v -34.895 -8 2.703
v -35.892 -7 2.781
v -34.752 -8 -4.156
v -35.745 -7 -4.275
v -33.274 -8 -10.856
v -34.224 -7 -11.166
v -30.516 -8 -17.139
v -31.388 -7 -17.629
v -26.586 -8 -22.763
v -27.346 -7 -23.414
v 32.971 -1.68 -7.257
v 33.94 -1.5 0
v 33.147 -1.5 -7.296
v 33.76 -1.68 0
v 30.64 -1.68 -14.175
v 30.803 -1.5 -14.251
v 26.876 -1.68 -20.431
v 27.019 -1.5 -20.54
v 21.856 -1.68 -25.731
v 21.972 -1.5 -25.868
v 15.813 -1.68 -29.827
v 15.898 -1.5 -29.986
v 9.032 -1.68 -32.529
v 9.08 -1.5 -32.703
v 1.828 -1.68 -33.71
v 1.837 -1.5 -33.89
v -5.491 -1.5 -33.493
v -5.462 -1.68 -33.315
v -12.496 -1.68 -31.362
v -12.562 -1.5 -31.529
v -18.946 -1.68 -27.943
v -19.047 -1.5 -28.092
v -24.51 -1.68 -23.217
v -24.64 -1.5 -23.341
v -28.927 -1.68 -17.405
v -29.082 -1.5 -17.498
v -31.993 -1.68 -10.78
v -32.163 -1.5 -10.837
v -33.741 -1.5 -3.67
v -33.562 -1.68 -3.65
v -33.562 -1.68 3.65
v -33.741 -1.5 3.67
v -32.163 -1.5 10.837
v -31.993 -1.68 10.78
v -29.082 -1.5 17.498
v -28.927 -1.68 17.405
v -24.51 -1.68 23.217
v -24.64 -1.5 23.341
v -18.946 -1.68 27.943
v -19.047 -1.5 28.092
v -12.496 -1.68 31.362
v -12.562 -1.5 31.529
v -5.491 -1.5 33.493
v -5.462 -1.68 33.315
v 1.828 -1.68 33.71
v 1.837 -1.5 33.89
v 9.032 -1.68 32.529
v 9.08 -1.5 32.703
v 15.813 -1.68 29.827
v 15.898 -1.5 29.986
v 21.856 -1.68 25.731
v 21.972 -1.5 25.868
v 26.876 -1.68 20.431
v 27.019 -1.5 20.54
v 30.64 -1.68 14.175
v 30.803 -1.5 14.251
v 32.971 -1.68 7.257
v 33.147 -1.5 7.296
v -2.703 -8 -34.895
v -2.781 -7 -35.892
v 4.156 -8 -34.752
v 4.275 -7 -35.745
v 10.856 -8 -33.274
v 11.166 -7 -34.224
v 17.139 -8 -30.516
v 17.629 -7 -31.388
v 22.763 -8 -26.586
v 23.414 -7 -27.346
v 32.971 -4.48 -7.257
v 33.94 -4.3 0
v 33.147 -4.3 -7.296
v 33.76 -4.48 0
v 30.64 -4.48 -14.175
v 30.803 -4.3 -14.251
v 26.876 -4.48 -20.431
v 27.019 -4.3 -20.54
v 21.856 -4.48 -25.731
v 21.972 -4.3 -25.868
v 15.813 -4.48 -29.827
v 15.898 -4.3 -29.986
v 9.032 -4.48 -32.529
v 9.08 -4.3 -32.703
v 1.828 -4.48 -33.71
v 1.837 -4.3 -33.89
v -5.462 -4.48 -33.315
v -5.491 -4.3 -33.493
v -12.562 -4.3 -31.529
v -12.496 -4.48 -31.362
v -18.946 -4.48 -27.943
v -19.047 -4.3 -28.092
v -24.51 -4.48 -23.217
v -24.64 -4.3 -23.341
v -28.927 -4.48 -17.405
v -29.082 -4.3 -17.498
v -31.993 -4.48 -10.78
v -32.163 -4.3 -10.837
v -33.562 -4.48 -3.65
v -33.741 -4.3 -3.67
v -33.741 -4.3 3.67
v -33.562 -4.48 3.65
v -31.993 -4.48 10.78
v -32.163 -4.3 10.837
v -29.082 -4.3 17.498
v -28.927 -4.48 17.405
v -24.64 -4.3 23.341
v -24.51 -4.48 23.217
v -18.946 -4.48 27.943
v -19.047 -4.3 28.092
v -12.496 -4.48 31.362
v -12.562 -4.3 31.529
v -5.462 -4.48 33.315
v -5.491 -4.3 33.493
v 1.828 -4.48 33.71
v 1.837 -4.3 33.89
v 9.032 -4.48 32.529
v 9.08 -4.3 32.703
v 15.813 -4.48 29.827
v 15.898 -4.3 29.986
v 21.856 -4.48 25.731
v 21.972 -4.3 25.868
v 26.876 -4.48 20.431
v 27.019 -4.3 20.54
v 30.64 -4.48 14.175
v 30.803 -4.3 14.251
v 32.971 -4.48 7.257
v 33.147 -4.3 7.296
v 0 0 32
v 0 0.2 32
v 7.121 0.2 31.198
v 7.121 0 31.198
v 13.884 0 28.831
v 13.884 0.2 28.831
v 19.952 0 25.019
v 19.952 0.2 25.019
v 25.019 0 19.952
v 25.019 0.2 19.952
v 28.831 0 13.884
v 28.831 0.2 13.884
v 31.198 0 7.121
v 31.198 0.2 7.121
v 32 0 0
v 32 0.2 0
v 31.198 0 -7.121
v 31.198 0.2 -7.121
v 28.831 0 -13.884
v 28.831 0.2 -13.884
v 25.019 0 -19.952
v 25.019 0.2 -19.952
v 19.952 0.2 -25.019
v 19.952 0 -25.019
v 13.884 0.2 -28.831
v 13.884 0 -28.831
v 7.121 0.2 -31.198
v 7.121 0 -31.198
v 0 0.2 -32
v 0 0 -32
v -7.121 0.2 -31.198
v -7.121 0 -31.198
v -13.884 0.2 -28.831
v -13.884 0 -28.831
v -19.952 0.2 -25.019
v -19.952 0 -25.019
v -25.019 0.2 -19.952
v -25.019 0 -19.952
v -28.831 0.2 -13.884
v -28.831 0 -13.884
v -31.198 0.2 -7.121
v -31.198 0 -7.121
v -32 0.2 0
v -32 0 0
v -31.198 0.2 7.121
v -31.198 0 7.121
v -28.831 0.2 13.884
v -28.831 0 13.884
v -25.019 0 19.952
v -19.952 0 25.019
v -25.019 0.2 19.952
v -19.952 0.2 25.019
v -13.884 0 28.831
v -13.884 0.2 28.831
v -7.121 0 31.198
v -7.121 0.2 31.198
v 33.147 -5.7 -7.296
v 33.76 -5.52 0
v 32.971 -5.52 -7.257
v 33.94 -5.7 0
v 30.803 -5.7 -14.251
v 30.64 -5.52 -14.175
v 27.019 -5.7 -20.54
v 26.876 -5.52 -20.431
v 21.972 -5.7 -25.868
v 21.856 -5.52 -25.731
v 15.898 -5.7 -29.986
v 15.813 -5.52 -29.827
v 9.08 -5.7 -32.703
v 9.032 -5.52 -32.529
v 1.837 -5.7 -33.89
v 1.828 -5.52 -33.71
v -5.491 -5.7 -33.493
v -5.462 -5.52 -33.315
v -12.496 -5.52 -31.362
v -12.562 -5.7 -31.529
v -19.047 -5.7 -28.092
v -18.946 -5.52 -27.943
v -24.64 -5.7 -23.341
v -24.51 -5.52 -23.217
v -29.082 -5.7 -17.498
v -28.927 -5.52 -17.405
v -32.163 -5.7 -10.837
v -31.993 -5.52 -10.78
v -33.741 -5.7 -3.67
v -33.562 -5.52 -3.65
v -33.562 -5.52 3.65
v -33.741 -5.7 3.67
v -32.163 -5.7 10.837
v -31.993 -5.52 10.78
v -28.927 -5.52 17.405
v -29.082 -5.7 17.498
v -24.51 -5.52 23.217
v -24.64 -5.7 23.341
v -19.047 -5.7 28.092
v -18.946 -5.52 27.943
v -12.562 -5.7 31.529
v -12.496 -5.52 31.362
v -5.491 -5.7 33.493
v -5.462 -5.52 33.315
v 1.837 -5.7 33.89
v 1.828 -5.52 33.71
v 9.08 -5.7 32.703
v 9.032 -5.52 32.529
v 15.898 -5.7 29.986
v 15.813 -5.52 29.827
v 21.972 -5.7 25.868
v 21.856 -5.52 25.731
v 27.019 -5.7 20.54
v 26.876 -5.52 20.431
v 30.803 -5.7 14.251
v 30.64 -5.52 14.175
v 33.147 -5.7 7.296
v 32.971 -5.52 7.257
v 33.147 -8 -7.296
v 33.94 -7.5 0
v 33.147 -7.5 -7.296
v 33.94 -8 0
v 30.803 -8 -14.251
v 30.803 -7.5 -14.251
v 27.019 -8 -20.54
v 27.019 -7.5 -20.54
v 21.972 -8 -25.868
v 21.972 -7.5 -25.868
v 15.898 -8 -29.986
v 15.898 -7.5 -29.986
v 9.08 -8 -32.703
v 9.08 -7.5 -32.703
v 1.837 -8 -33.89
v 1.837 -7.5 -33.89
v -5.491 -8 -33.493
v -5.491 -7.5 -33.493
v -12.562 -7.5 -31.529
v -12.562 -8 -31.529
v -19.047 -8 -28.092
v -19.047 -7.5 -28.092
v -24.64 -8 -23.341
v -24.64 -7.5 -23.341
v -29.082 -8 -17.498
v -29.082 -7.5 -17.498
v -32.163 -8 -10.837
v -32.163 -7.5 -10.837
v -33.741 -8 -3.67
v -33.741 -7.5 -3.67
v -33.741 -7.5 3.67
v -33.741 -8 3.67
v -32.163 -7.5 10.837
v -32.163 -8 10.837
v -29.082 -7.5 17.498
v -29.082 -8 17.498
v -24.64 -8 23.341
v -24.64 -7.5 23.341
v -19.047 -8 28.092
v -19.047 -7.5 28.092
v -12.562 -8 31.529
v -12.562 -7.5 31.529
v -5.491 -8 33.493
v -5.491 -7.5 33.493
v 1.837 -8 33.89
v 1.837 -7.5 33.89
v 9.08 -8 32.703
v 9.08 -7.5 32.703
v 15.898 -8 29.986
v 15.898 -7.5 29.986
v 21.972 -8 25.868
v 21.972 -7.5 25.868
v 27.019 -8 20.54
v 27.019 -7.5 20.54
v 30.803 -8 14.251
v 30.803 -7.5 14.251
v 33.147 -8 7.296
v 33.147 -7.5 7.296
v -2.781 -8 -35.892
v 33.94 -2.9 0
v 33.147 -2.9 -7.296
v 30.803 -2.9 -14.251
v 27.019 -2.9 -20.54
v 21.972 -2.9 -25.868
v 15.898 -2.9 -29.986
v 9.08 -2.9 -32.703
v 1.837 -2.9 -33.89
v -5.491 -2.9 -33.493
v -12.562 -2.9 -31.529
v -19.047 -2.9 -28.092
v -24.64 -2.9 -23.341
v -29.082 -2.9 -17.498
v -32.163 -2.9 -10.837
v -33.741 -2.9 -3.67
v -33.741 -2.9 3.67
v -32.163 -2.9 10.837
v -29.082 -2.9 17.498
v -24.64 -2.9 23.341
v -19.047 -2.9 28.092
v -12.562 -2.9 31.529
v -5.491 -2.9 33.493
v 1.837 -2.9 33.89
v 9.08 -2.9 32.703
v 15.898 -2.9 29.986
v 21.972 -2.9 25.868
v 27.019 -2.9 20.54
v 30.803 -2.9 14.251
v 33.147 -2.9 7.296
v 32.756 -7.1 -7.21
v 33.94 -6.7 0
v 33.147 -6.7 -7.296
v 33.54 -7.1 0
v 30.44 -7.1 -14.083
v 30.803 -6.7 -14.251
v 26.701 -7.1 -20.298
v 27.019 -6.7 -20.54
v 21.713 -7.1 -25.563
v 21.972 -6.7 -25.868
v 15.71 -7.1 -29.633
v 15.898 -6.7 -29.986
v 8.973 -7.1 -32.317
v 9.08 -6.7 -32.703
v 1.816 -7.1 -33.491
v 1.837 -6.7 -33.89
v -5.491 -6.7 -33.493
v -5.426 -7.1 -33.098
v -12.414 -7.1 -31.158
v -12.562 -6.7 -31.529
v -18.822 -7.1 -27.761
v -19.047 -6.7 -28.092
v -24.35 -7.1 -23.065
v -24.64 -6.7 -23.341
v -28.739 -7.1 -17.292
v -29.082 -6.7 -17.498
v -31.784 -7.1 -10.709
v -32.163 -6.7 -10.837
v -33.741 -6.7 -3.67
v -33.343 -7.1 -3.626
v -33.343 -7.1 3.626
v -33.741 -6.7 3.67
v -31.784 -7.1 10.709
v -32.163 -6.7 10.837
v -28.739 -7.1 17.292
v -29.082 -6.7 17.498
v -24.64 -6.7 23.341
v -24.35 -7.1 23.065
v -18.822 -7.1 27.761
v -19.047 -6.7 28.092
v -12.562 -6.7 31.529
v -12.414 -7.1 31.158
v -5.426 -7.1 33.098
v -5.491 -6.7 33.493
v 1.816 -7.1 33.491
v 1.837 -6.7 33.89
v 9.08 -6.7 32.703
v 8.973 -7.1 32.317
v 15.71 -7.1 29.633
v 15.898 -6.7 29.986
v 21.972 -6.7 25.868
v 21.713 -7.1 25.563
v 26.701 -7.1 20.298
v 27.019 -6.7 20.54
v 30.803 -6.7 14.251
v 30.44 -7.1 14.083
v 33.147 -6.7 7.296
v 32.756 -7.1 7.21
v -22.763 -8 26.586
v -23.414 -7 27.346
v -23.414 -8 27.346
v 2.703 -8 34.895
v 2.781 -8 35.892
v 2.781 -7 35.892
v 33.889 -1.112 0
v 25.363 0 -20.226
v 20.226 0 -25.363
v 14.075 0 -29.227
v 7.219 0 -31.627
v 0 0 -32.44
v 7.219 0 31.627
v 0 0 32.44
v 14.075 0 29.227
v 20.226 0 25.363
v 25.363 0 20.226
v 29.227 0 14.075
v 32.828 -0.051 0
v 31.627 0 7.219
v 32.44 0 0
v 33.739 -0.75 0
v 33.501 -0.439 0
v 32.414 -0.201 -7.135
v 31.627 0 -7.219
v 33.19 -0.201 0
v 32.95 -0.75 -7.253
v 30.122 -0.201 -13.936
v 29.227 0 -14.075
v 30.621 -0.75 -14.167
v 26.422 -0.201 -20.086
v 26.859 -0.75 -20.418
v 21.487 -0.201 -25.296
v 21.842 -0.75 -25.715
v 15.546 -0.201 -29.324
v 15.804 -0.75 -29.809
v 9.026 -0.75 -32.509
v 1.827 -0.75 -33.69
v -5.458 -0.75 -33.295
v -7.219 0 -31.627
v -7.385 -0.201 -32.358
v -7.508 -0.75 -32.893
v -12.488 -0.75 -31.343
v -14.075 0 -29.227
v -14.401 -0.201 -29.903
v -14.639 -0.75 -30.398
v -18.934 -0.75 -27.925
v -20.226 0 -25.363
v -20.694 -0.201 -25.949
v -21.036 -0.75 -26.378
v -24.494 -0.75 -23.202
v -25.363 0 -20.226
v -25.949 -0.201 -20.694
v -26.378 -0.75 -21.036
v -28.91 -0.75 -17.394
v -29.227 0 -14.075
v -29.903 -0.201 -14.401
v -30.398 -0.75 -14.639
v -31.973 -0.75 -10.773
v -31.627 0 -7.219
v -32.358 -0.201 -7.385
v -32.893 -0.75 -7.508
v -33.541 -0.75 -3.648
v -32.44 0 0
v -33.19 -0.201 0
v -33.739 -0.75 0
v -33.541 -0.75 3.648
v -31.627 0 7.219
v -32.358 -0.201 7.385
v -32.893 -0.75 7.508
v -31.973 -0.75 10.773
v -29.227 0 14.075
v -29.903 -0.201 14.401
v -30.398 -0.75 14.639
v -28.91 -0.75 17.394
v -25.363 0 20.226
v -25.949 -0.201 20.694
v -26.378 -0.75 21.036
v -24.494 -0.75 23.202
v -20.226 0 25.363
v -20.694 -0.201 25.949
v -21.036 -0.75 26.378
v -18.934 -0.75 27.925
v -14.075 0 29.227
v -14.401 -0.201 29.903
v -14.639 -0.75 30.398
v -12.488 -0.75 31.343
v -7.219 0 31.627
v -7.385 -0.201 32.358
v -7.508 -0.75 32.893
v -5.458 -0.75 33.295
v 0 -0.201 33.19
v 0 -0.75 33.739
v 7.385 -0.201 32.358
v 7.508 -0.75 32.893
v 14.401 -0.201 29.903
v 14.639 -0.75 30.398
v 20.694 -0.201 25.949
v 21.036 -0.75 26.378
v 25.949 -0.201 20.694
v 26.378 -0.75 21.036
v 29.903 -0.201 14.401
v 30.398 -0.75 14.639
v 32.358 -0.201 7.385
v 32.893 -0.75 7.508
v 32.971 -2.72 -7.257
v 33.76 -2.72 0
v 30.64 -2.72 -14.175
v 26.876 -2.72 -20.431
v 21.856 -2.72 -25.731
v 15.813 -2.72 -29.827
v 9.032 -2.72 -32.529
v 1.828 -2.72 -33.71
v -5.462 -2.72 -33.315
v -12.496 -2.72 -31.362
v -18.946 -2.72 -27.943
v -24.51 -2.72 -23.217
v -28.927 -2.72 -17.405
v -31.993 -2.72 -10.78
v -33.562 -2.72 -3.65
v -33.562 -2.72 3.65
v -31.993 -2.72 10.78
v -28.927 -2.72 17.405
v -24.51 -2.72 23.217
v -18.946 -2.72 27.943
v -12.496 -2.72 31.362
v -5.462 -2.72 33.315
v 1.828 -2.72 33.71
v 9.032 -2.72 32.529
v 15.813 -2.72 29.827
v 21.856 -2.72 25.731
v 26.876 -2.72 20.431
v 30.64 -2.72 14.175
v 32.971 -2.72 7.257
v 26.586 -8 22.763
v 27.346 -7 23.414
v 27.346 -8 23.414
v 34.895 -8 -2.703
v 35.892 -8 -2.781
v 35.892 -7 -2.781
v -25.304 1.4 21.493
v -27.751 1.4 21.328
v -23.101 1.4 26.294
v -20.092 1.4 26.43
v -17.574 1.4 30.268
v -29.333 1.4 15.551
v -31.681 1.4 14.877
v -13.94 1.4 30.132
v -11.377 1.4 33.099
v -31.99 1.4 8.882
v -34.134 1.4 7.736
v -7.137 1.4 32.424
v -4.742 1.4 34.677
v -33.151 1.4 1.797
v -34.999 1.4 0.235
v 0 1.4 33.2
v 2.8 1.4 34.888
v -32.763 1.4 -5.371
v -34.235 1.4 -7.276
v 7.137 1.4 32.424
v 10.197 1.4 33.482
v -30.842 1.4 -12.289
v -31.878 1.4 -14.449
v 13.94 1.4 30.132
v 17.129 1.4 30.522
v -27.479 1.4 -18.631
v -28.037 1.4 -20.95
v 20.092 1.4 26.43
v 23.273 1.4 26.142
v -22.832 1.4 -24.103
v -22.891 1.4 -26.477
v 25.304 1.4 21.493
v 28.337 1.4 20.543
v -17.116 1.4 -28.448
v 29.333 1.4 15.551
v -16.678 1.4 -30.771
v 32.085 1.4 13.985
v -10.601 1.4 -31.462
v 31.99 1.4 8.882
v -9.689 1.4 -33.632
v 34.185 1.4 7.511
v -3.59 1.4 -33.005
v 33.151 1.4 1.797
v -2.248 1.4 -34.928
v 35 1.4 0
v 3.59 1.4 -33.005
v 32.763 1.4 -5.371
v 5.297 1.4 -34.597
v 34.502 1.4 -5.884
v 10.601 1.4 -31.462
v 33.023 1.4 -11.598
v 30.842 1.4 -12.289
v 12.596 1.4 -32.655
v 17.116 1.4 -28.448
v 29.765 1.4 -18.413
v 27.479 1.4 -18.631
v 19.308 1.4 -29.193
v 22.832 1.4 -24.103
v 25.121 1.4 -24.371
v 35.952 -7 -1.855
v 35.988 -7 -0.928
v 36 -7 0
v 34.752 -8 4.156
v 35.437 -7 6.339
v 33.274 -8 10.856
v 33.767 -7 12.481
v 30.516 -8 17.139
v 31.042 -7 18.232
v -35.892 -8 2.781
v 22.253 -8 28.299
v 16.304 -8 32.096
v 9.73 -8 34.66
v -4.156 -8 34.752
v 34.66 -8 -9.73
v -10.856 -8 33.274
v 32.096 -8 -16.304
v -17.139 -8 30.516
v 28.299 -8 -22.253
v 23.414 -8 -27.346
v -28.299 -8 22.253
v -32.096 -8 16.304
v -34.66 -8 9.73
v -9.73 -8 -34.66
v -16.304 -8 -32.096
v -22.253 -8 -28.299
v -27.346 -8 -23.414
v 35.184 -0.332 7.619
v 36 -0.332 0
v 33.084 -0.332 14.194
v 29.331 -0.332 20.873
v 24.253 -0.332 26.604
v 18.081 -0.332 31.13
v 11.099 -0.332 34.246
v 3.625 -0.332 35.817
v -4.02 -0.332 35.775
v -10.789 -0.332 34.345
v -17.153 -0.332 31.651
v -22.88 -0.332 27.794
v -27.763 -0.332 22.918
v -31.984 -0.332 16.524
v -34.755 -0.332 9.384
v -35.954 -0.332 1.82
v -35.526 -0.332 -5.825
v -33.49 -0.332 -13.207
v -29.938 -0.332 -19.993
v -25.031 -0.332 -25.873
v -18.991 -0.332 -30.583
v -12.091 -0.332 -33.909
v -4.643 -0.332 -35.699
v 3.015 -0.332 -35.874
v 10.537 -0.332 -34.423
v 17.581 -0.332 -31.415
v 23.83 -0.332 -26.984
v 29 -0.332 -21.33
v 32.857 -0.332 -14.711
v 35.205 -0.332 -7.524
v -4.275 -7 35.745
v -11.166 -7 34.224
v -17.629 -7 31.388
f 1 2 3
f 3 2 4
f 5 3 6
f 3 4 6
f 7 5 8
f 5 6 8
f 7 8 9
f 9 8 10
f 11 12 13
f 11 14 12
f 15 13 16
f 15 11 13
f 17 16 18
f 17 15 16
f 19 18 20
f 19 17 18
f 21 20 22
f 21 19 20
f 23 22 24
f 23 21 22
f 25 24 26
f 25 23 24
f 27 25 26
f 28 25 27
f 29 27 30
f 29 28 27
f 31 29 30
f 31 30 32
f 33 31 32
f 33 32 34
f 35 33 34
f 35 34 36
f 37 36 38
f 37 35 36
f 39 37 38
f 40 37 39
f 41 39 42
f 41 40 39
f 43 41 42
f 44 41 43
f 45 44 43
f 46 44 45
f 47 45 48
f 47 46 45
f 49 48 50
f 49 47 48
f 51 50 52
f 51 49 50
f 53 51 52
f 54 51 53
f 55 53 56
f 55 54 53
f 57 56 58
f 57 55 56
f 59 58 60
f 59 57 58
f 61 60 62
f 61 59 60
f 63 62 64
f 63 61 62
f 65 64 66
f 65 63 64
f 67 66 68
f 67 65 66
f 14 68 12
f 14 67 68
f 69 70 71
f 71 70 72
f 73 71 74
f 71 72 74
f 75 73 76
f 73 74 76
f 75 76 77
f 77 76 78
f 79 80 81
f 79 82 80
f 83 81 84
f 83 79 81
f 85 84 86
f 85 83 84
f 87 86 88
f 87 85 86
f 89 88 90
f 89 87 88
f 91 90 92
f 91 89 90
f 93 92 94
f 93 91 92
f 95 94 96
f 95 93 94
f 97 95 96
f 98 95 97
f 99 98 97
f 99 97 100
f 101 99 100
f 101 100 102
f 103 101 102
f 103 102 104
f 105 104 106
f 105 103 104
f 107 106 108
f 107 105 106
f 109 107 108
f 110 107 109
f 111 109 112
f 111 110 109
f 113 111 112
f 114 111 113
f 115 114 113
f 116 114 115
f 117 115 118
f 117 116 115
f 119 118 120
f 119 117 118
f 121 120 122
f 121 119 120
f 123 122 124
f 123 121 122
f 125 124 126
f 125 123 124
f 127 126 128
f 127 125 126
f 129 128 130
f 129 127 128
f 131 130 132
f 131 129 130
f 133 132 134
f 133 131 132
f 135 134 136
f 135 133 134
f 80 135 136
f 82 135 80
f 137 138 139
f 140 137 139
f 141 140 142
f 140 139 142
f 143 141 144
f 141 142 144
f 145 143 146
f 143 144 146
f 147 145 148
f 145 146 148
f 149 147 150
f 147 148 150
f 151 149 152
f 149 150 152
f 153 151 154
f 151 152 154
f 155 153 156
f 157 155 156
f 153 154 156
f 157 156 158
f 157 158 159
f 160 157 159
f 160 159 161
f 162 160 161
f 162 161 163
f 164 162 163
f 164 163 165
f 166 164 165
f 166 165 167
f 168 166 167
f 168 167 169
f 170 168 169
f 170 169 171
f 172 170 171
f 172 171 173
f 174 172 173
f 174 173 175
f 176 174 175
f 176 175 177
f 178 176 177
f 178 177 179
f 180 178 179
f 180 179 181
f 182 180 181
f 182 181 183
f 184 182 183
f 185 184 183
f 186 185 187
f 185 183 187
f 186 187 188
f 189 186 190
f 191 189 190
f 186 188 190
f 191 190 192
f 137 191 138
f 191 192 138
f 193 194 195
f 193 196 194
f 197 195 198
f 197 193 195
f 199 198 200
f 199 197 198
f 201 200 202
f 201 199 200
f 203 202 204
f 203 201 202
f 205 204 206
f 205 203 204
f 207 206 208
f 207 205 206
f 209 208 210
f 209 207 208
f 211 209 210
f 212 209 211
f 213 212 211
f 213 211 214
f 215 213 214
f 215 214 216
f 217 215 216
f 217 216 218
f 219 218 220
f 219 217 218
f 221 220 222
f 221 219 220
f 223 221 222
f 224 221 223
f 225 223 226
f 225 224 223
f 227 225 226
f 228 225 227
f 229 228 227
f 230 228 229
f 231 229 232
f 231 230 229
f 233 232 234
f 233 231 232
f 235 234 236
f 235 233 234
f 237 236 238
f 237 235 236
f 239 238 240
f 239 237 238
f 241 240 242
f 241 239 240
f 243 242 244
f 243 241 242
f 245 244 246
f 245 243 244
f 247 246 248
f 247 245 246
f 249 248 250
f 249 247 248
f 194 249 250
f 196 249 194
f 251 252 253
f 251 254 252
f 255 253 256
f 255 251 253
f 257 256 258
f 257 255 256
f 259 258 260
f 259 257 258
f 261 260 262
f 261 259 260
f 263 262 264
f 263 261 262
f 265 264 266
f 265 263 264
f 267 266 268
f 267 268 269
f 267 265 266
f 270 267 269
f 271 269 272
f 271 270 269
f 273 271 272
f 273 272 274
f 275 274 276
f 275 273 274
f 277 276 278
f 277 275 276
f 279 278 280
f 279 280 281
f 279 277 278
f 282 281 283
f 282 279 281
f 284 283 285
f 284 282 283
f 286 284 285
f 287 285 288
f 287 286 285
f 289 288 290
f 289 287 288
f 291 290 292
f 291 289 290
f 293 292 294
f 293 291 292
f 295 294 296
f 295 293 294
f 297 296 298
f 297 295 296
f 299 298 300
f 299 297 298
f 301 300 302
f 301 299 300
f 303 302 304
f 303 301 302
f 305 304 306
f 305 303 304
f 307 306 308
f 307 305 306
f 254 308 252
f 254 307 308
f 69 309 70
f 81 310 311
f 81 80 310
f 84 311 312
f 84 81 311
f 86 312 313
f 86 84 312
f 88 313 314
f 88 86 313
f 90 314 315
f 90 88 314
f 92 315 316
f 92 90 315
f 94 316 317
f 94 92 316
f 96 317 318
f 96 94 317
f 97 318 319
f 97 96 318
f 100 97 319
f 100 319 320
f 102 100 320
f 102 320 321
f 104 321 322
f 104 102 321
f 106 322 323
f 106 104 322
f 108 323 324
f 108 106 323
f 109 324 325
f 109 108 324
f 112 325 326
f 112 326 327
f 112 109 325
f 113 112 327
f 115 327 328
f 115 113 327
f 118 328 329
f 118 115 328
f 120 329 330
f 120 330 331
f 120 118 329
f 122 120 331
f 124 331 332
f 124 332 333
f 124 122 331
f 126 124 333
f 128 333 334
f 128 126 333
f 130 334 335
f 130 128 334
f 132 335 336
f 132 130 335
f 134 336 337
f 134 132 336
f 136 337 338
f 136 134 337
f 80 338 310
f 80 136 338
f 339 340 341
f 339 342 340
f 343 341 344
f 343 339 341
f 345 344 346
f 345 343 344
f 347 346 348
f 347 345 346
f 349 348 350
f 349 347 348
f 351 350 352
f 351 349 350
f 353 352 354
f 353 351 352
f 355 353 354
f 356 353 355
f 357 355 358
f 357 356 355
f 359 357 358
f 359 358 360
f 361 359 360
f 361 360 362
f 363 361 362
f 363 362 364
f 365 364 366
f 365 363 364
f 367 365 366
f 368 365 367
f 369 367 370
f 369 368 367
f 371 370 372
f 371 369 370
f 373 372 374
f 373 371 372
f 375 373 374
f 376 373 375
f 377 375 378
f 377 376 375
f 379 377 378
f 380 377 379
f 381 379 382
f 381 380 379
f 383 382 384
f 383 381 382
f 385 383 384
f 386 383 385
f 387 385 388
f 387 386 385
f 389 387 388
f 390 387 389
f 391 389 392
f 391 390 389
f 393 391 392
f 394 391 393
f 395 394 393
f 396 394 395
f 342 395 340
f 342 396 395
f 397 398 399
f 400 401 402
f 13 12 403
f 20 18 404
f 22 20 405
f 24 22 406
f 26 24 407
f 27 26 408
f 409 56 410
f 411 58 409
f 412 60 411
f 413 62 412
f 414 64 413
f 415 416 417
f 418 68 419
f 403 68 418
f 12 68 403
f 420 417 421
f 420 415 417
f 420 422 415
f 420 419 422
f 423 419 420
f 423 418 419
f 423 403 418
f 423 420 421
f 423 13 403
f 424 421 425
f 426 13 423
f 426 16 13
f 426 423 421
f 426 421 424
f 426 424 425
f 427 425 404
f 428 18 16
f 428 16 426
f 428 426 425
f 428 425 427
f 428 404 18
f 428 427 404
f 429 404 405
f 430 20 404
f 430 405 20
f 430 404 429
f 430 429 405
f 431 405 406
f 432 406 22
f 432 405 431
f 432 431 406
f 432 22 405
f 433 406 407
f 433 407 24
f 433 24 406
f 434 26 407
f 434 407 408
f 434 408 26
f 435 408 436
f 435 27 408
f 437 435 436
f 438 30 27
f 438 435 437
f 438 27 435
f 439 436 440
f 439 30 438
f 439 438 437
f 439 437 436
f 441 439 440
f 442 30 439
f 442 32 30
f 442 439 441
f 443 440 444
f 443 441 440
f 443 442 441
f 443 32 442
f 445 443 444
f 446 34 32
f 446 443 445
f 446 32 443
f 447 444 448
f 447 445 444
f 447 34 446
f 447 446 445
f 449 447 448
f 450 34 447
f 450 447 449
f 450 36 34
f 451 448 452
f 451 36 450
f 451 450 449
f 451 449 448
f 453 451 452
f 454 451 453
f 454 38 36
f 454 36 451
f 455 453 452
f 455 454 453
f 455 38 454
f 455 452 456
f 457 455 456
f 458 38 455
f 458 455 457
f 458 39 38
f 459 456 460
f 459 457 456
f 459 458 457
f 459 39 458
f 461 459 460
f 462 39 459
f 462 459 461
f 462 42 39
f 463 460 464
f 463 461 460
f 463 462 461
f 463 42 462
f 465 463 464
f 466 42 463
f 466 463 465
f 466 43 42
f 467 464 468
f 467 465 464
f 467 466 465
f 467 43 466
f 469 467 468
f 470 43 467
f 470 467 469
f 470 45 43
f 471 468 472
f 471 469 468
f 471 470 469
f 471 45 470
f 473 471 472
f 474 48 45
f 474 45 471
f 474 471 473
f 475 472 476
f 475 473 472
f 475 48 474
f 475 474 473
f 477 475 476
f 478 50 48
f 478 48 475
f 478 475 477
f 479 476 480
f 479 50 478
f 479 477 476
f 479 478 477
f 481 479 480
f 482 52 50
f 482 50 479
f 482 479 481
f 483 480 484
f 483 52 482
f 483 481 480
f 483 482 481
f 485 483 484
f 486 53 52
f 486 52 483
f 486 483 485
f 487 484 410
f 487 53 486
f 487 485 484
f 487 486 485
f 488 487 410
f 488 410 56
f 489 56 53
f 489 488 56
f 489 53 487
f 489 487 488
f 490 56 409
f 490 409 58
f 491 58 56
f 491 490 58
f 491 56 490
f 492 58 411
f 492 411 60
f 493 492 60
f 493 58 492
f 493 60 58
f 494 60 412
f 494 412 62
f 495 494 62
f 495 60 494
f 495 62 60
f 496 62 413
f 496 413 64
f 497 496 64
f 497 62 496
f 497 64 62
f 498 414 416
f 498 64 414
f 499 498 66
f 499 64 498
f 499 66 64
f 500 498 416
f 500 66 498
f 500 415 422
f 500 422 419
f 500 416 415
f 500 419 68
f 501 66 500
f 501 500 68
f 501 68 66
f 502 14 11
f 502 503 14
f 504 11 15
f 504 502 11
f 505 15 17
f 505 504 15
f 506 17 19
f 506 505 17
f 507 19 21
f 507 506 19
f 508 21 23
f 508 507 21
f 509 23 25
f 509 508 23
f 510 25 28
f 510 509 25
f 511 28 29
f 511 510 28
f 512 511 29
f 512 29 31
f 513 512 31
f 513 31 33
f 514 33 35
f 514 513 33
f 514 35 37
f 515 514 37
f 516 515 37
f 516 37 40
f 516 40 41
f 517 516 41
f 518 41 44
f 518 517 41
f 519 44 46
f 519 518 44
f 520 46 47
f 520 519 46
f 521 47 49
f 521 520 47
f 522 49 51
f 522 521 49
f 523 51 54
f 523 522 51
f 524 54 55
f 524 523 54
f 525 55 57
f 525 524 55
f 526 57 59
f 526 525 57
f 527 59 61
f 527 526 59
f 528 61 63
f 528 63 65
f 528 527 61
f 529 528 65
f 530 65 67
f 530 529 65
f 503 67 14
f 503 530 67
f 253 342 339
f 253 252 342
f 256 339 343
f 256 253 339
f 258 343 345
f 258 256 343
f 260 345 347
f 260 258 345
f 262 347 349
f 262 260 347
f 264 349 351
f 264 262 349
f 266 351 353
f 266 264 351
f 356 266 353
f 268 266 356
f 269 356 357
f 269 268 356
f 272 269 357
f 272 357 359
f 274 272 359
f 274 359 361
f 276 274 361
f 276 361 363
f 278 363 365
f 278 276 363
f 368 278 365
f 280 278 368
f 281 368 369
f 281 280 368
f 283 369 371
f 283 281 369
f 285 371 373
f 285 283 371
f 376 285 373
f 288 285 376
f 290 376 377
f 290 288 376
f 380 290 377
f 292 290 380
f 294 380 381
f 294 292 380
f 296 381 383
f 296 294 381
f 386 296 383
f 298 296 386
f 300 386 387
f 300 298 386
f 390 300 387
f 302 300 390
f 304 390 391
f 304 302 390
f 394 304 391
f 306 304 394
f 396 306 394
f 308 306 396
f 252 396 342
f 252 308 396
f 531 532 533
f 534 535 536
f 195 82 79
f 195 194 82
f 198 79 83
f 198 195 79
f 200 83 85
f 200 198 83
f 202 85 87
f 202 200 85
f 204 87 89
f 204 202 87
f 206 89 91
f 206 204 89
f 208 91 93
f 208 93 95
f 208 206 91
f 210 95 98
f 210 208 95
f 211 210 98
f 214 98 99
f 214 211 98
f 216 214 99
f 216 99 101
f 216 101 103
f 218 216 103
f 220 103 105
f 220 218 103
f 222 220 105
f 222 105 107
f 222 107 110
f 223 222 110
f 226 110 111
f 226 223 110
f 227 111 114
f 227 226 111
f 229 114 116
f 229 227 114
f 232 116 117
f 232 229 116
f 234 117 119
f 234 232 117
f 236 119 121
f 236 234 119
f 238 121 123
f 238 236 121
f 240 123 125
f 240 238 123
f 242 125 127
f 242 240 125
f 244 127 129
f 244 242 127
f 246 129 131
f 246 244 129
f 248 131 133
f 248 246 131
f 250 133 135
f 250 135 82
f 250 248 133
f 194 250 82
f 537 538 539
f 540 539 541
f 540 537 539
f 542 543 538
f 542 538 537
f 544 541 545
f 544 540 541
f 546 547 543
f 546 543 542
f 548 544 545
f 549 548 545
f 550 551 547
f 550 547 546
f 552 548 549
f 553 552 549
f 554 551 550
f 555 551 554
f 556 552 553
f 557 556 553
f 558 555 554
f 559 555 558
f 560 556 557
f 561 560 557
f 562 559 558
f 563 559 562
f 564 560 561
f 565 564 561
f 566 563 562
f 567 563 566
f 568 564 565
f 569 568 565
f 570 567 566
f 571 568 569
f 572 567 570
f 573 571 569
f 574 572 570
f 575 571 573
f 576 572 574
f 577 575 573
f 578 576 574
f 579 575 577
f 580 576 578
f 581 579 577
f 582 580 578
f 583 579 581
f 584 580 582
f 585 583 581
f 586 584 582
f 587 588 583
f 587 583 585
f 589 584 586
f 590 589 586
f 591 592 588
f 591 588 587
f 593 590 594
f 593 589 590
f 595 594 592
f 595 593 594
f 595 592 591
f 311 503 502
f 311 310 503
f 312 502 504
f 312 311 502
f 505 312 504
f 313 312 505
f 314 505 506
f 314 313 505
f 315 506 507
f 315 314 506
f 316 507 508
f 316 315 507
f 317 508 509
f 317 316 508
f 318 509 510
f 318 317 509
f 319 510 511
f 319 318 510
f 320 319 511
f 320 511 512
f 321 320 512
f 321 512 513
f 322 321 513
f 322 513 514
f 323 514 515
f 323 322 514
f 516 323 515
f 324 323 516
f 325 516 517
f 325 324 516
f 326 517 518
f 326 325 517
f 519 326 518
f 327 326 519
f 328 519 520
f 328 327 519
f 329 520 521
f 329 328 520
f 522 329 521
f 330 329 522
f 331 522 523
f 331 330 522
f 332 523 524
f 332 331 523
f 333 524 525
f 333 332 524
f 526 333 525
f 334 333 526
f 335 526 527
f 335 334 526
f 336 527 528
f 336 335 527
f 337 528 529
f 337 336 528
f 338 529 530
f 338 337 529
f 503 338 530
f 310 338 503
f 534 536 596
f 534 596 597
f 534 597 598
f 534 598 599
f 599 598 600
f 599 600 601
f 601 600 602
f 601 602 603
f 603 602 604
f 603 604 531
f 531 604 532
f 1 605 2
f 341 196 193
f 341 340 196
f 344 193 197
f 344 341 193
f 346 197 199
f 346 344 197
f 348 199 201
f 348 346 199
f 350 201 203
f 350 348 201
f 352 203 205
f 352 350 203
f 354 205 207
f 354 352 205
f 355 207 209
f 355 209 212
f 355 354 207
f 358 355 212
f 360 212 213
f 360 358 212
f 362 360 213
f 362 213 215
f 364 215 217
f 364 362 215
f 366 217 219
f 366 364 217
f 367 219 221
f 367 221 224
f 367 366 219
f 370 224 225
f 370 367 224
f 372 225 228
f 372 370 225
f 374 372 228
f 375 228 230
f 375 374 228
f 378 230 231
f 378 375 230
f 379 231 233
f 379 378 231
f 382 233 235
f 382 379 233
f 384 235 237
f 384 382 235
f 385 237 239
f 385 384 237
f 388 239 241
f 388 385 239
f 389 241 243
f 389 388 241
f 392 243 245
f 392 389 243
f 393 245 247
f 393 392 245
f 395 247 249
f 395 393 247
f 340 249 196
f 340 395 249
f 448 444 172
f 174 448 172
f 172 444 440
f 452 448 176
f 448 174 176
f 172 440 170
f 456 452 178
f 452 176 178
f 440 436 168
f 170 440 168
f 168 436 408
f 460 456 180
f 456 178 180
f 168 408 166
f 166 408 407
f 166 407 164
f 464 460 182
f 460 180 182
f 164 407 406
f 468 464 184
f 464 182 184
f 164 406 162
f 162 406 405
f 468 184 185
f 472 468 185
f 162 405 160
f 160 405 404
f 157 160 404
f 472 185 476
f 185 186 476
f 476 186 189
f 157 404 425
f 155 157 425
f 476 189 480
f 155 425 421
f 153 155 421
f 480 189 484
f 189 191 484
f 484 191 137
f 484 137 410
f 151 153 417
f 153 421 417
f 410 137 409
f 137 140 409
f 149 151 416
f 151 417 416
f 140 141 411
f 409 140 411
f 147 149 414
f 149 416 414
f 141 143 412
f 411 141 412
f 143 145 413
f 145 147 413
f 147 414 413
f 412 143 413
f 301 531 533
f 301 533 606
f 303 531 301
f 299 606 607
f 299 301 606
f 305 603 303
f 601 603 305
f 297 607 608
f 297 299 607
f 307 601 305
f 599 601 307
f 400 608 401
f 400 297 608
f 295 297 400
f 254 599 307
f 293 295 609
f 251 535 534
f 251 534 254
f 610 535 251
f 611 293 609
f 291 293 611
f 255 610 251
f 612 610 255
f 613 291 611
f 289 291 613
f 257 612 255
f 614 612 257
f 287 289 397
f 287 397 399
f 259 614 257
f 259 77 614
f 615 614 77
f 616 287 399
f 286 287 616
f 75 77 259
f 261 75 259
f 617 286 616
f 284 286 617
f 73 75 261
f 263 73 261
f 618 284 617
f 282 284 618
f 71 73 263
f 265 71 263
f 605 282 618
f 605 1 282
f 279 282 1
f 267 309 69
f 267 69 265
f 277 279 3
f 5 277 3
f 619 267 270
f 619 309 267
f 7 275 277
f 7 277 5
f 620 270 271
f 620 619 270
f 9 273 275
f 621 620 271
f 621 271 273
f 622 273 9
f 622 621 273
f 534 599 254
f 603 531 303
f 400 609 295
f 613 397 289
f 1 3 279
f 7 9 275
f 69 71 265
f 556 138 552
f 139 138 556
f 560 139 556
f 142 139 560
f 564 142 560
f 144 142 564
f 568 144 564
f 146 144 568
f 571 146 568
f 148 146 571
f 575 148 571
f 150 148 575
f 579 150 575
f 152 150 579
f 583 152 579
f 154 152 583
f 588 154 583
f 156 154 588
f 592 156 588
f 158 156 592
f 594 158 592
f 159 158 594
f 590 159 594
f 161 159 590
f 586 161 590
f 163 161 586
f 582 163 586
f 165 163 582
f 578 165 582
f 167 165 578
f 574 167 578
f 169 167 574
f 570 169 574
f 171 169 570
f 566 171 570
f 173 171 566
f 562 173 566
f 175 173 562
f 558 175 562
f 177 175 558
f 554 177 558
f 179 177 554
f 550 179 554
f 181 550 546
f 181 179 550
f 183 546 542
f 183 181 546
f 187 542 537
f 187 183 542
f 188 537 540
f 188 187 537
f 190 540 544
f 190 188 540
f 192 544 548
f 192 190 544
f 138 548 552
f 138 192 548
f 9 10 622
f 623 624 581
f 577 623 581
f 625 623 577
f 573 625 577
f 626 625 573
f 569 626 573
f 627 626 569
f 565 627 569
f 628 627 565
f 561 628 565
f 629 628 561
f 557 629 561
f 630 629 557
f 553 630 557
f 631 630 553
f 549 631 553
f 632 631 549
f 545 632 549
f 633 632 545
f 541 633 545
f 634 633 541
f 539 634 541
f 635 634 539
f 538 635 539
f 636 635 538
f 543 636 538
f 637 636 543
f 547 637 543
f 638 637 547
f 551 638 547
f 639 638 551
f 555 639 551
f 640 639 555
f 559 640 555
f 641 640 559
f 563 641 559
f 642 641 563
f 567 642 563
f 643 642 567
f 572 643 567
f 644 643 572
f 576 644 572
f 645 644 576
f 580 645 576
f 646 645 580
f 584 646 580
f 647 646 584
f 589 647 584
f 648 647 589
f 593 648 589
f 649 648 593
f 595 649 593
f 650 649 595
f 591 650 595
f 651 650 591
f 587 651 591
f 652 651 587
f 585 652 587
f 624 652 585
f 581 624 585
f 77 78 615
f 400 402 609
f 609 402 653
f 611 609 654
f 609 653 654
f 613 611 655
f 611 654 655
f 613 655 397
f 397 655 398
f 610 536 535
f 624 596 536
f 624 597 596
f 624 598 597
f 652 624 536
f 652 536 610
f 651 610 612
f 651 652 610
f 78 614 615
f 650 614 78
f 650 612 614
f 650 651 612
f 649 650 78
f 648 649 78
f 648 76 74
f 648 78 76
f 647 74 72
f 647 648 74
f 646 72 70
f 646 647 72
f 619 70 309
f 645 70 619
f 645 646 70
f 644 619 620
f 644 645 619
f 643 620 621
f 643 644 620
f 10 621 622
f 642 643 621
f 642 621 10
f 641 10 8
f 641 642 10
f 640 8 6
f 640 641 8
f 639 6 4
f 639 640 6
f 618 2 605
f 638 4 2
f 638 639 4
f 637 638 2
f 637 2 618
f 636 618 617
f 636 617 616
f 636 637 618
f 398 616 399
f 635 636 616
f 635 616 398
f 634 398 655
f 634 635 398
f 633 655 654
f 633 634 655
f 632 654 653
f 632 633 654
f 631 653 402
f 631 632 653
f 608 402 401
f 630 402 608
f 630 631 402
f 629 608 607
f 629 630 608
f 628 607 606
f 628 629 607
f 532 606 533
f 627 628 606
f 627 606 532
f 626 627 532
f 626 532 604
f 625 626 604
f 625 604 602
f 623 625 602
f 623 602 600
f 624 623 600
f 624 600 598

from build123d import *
from build123d.topology import SkipClean

# Parameters (mm, degrees)
SKETCH_1_R               = 36
EXTRUDE_1_DEPTH          = 2.4
SKETCH_3_R               = 32
CUT_EXTRUDE_1_DEPTH      = 10
SKETCH_4_R               = 36
CUT_EXTRUDE_2_DEPTH      = 1
CHAMFER_3_SIZE           = 1.732
CHAMFER_3_SIZE2          = 0.999970666
CHAMFER_2_SIZE           = 1.2
CUT_REVOLVE_1_ANGLE      = 45
PATTERN_CIRCULAR_1_COUNT = 4


with BuildPart() as part:
    # 草图1 → 凸台-拉伸1 (new body)
    with BuildSketch(Plane(origin=(0, 0, 0), x_dir=(1, 0, 0), z_dir=(0, 1, 0))):
        with Locations(Location((0, 0, 0), (0, 0, 270))):
            Circle(SKETCH_1_R)
    extrude(amount=EXTRUDE_1_DEPTH)

    # 草图2 → 旋转1 (revolve)
    with SkipClean():  # the faces are left unmerged after this step: merging them gives an invalid solid
        with BuildSketch(Plane.XY):
            with BuildLine():
                Line((33.94, -7.5), (33.94, -8))
                Line((33.94, -8), (36, -8))
                Line((36, -8), (36, 0))
                Line((36, 0), (32.44, 0))
                ThreePointArc((32.44, 0), (33.500660172, -0.439339828), (33.94, -1.5))
                Line((33.94, -1.5), (33.76, -1.68))
                Line((33.76, -1.68), (33.76, -2.72))
                Line((33.76, -2.72), (33.94, -2.9))
                Line((33.94, -2.9), (33.94, -4.3))
                Line((33.94, -4.3), (33.76, -4.48))
                Line((33.76, -4.48), (33.76, -5.52))
                Line((33.76, -5.52), (33.94, -5.7))
                Line((33.94, -5.7), (33.94, -6.7))
                Line((33.94, -6.7), (33.54, -7.1))
                Line((33.54, -7.1), (33.94, -7.5))
            make_face()
        revolve(axis=Axis((0, -23.4, 0), (0, 1, 0)))
    add(part.part.scale(1), mode=Mode.REPLACE)  # the faces are merged on a copy

    # 草图3 → 切除-拉伸1 (cut)
    with BuildSketch(Plane(origin=(0, 2.4, 0), x_dir=(1, 0, 0), z_dir=(0, 1, 0))):
        with Locations(Location((0, 0, 0), (0, 0, 270))):
            Circle(SKETCH_3_R)
    extrude(amount=-CUT_EXTRUDE_1_DEPTH, mode=Mode.SUBTRACT)

    # 草图4 → 切除-拉伸2 (cut)
    with BuildSketch(Plane(origin=(0, 2.4, 0), x_dir=(1, 0, 0), z_dir=(0, 1, 0))):
        Circle(SKETCH_4_R)
    extrude(amount=-CUT_EXTRUDE_2_DEPTH, mode=Mode.SUBTRACT)

    # 倒角3
    chamfer_3_edges = [part.edges().sort_by_distance(p)[0] for p in [
        (0, 1.4, -36),
    ]]
    chamfer_3_side = [part.faces().sort_by_distance(p)[0] for p in [
        (0, 0.7, -36),
    ]]
    chamfer(chamfer_3_edges, length=CHAMFER_3_SIZE, length2=CHAMFER_3_SIZE2, reference=chamfer_3_side[0])

    # 倒角2
    chamfer_2_edges = [part.edges().sort_by_distance(p)[0] for p in [
        (0, 1.4, -32),
    ]]
    chamfer(chamfer_2_edges, length=CHAMFER_2_SIZE)

    # 草图6 → 切除-旋转1 (revolve, cut)
    with BuildSketch(Plane(origin=(0, 0, 0), x_dir=(0.9970124779095012, 0, -0.07724065569864448), z_dir=(0.07724065569864448, 0, 0.9970124779095012))):
        Polygon((-35, -8), (-36, -7), (-36, -8), align=None)
    cut_revolve_1 = revolve(axis=Axis((0, -23.4, 0), (0, -1, 0)), revolution_arc=CUT_REVOLVE_1_ANGLE, mode=Mode.SUBTRACT)

    # 阵列(圆周)1: 切除-旋转1 ×4 about axis
    pattern_circular_1_axis = Axis((0, -23.4, 0), (0, 1, 0))
    for i in range(1, PATTERN_CIRCULAR_1_COUNT):
        add(cut_revolve_1.rotate(pattern_circular_1_axis, i * 360 / PATTERN_CIRCULAR_1_COUNT), mode=Mode.SUBTRACT)


solid = part.part
